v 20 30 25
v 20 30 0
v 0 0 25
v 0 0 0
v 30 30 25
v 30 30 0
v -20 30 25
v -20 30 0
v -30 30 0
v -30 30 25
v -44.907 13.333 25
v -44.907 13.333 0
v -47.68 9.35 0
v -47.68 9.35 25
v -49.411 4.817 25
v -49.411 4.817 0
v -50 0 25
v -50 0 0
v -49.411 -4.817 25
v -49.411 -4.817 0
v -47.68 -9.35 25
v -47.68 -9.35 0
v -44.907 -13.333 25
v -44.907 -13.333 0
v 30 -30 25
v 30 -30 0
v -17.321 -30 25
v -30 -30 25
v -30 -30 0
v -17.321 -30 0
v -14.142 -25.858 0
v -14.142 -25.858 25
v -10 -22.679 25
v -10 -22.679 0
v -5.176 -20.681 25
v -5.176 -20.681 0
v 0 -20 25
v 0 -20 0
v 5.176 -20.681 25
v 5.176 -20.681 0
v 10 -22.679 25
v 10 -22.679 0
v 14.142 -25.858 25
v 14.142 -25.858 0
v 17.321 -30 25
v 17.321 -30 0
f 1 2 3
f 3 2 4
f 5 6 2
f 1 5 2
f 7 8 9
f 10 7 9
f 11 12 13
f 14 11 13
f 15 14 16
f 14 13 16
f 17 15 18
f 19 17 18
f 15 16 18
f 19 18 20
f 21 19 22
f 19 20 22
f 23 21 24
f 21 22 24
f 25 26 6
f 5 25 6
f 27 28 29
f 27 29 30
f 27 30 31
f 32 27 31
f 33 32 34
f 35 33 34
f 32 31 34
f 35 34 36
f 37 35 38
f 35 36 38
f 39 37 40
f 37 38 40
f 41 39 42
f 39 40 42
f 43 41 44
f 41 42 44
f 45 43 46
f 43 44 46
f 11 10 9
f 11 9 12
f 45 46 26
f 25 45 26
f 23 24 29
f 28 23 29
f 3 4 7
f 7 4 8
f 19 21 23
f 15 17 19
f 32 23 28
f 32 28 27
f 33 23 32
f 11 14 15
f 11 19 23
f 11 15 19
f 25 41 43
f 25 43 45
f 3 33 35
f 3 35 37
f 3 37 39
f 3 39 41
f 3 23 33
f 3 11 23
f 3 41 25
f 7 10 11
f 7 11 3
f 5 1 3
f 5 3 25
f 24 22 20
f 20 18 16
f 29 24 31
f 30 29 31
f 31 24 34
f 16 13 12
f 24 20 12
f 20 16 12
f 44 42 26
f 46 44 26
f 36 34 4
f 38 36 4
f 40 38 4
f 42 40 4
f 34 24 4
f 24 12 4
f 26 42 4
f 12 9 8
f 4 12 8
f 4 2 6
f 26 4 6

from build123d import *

# Parameters (mm, degrees)
F1_DEPTH = 25


with BuildPart() as f1:
    # F0 (on Top) → F1 (new body)
    with BuildSketch(Plane.XY):
        with BuildLine():
            Line((0, 0), (-20, 30))
            Line((-20, 30), (-30, 30))
            Line((-30, 30), (-44.90712, 13.333333))
            ThreePointArc((-44.90712, 13.333333), (-50, 0), (-44.90712, -13.333333))
            Line((-44.90712, -13.333333), (-30, -30))
            Line((-30, -30), (-17.320508, -30))
            ThreePointArc((-17.320508, -30), (0, -20), (17.320508, -30))
            Line((17.320508, -30), (30, -30))
            Line((30, -30), (30, 30))
            Line((30, 30), (20, 30))
            Line((20, 30), (0, 0))
        make_face()
    extrude(amount=F1_DEPTH)


solid = f1.part
